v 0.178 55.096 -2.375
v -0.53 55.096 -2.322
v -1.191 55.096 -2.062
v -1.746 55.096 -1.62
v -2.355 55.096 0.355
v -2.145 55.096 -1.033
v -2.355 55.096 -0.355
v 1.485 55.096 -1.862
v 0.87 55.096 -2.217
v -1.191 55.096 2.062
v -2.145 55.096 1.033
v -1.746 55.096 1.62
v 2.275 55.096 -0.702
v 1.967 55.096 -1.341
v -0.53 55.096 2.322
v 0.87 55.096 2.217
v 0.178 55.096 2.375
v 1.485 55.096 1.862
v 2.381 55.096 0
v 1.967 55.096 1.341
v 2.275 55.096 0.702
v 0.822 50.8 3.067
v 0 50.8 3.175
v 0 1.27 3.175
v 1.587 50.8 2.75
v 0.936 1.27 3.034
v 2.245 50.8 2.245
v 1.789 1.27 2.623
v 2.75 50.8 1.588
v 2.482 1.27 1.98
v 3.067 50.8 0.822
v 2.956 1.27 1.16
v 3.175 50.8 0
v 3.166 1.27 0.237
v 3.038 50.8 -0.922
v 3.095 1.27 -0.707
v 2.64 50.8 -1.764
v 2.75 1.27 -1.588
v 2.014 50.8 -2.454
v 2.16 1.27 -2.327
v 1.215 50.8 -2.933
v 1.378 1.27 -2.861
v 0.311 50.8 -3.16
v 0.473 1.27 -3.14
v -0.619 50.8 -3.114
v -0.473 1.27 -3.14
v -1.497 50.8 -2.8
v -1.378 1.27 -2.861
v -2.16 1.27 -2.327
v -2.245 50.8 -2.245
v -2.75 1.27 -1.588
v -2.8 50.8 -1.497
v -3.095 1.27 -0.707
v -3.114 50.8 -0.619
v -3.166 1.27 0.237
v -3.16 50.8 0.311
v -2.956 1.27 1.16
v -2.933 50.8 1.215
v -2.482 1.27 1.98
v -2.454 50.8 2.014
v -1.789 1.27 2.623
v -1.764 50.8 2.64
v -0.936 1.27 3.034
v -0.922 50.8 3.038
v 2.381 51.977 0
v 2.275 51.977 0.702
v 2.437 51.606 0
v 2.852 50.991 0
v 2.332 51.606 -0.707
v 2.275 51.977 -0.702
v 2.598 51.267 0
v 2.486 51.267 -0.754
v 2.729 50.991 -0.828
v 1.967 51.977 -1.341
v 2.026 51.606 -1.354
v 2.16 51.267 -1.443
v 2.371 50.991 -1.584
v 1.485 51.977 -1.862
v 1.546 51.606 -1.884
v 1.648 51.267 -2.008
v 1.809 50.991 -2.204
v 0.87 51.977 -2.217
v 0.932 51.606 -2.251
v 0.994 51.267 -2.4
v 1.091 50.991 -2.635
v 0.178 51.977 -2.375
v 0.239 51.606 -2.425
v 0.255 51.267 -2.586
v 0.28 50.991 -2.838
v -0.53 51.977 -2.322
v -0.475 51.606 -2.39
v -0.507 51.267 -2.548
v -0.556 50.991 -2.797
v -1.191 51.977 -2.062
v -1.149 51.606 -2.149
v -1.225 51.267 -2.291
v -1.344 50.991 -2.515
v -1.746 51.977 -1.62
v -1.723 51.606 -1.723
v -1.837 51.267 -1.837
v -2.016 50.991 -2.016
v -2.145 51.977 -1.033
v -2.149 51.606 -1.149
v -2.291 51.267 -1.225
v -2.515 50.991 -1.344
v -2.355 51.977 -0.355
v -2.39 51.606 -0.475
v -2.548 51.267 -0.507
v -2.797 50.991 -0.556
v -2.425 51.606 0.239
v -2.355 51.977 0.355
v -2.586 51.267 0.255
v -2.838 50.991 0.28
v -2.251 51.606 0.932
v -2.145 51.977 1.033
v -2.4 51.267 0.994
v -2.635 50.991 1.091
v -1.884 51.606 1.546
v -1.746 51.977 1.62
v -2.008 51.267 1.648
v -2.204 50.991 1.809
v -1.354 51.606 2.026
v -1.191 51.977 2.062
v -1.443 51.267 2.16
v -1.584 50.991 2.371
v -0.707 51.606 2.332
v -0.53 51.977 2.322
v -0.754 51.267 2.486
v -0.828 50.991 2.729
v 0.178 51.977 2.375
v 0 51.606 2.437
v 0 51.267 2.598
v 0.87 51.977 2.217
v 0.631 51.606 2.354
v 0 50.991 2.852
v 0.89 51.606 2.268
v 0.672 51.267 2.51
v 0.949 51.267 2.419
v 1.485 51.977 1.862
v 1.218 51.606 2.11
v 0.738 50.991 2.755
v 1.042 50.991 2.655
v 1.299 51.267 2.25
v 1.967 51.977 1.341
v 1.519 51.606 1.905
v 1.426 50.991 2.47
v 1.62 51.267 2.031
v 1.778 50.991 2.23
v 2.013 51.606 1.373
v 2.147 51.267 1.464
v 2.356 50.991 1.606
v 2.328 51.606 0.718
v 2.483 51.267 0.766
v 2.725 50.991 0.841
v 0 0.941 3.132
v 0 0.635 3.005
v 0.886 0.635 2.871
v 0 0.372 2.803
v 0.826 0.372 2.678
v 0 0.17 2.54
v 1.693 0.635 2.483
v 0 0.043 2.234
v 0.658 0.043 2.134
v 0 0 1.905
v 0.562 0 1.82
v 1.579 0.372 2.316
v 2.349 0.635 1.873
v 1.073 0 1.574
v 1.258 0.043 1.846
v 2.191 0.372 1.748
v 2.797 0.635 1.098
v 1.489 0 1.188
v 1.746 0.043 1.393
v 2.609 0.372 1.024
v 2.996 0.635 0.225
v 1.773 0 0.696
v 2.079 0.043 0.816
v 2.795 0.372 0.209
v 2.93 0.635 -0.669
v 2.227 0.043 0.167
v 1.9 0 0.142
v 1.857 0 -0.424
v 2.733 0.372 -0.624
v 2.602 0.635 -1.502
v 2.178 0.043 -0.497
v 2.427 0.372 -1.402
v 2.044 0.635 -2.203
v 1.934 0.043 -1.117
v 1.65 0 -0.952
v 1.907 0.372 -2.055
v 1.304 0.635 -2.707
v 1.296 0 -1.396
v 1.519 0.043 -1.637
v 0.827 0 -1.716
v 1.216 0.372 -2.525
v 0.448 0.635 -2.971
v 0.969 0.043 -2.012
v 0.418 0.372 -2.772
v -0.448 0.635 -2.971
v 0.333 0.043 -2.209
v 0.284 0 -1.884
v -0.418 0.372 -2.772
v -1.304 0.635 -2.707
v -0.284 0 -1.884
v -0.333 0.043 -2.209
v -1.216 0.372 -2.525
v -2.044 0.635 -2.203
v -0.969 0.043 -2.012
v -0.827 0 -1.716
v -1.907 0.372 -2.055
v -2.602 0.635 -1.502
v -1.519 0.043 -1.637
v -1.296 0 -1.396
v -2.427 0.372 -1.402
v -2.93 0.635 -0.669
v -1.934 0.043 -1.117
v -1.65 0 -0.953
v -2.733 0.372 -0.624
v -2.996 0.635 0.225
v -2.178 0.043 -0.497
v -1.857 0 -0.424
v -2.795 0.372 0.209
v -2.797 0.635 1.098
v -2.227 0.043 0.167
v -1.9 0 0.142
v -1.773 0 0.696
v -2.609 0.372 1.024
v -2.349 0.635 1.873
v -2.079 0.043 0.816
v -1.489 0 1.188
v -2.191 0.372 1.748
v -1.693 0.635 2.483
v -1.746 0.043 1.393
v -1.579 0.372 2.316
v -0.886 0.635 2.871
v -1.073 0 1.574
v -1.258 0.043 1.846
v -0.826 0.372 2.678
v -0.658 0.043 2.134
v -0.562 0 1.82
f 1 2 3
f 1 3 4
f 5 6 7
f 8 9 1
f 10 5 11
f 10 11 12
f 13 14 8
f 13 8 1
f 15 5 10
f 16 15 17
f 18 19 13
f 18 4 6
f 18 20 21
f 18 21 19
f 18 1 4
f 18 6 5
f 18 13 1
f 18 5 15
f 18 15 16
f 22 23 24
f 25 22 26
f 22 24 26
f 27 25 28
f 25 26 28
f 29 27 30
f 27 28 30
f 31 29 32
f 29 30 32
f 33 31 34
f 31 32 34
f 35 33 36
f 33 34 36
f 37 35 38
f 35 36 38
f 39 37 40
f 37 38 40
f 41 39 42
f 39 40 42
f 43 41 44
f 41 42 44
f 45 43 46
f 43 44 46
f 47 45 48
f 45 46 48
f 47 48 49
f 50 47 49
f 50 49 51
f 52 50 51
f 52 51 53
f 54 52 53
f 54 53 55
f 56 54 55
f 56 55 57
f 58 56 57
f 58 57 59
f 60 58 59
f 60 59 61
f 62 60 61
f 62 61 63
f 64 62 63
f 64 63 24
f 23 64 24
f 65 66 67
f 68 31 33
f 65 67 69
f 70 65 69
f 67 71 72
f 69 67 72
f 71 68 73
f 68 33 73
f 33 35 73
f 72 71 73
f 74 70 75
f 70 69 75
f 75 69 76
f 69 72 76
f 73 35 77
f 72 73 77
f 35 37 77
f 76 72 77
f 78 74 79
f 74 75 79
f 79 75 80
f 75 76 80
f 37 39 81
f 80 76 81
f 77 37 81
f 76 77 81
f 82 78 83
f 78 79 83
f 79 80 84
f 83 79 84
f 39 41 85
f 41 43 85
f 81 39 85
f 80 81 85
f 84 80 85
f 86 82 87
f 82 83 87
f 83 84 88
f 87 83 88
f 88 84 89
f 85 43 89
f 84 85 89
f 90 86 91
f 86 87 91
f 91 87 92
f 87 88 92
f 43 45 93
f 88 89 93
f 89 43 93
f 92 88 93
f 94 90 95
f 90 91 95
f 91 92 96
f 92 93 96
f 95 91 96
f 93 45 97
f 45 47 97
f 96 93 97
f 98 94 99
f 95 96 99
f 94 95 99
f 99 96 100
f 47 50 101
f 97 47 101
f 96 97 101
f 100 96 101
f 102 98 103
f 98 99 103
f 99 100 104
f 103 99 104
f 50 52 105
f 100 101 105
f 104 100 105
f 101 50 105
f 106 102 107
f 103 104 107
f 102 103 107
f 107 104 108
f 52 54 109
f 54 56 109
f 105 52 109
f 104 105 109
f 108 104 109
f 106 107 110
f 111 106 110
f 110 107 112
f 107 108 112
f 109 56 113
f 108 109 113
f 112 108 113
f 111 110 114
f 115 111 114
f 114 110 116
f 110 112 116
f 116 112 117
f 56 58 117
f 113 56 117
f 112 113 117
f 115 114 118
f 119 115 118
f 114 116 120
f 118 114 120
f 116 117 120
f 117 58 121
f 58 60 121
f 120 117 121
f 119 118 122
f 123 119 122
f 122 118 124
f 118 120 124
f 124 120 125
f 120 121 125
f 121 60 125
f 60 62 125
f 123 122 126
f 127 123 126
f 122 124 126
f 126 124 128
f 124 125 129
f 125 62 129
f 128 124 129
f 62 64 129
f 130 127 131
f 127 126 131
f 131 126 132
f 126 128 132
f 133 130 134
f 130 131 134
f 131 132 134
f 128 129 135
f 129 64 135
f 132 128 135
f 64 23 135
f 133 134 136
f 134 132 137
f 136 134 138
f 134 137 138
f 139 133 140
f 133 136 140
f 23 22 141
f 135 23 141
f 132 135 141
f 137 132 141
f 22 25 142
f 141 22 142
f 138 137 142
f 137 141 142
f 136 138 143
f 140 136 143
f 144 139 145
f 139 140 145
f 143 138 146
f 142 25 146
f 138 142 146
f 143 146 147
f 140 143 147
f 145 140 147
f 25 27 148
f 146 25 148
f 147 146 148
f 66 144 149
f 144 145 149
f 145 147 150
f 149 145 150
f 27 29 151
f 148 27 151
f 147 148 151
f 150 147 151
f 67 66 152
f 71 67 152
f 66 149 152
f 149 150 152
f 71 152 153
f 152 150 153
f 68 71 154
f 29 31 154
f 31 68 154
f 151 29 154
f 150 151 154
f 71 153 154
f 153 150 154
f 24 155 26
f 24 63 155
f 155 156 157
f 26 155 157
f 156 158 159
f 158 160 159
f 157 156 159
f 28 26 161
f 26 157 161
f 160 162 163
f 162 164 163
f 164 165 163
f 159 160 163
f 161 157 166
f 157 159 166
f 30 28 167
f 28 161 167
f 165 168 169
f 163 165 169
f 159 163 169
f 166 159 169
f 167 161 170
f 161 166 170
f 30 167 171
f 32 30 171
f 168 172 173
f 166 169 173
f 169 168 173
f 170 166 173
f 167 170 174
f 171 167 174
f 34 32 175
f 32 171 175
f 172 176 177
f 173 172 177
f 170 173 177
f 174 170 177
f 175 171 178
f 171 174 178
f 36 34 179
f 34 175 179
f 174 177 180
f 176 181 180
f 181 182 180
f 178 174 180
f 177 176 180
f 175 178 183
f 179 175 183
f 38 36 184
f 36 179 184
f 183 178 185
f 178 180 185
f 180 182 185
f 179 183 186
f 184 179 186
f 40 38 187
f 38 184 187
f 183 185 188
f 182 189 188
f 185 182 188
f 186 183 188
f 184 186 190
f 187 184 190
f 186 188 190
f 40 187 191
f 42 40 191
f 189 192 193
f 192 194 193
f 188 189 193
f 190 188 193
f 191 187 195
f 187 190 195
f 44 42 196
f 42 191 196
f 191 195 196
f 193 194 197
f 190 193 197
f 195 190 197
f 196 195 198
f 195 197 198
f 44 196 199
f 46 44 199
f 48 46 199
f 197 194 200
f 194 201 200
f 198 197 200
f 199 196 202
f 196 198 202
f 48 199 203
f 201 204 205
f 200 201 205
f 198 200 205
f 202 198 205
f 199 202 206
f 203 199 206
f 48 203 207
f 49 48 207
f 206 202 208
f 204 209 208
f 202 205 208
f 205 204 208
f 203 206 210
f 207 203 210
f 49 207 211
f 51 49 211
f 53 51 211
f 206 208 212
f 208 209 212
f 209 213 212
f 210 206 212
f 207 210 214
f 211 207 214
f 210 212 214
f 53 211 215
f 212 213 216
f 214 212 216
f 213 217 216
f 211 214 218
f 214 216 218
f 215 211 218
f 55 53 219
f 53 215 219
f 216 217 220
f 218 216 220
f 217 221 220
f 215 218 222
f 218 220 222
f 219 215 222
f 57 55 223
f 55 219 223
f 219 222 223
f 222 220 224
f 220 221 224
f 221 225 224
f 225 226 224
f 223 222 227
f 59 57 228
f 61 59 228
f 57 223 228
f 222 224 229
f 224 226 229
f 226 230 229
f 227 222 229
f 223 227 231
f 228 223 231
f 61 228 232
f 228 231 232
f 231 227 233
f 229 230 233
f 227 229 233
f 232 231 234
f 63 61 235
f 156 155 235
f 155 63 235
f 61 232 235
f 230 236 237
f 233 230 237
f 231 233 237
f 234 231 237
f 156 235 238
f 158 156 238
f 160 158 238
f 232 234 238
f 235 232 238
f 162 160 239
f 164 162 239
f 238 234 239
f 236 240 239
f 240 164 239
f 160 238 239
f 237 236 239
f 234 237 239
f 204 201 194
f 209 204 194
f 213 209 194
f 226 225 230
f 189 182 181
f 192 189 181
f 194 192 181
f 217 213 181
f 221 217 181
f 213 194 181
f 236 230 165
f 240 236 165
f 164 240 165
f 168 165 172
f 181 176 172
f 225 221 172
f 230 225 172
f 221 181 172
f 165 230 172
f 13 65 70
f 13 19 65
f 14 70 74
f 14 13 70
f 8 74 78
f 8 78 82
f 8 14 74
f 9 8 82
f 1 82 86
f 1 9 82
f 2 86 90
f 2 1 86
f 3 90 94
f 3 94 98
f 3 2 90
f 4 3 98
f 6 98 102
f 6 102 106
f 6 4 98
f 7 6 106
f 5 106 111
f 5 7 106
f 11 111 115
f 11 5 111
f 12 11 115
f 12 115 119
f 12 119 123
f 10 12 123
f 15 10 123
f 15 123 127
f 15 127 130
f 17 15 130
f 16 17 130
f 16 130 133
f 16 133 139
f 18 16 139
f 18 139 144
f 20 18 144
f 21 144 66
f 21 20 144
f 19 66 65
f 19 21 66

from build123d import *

# Parameters (mm, degrees)
SKETCH1_R           = 3.175
BOSS_EXTRUDE1_DEPTH = 50.8
FILLET1_R           = 1.27
SKETCH4_R           = 2.38125
FILLET2_R           = 1.27


with BuildPart() as part:
    # Sketch1 → Boss-Extrude1 (new body)
    with BuildSketch(Plane(origin=(0, 0, 0), x_dir=(1, 0, 0), z_dir=(0, 1, 0))):
        with Locations(Location((0, 0, 0), (0, 0, 270))):
            Circle(SKETCH1_R)
    extrude(amount=BOSS_EXTRUDE1_DEPTH)

    # Fillet1
    fillet1_edges = [part.edges().sort_by_distance(p)[0] for p in [
        (0, 0, -3.175),
    ]]
    fillet(fillet1_edges, radius=FILLET1_R)

    # Sweep1: sweep along a path in Sketch2
    with BuildLine(Plane.XY) as sweep1_path:
        Line((0, 50.8), (0, 55.095962307))
    # Sketch4 → Sweep1 (sweep)
    with BuildSketch(Plane(origin=(0, 50.8, 0), x_dir=(1, 0, 0), z_dir=(0, 1, 0))):
        Circle(SKETCH4_R)
    sweep(path=sweep1_path.line)

    # Fillet2
    # the kernel refuses this fillet: 1.27 mm, written as the material it adds along each edge
    with BuildSketch(Plane(origin=(0, 50.8, 0), x_dir=(1, 0, 0), z_dir=(0, 0, 1))) as fillet2_piece_1:
        with BuildLine():
            CenterArc((3.65125, 1.17732151), FILLET2_R, 180, 67.975687163)
            Line((2.38125, 1.17732151), (2.35585, 1.17732151))
            Line((2.35585, 1.17732151), (2.35585, 0))
            Line((2.35585, 0), (2.38125, -0.0254))
            ThreePointArc((2.38125, -0.0254), (2.778125, -0.0254), (3.165475, -0.02354643))
            Line((3.165475, -0.02354643), (3.175, 0))
        make_face()
    revolve(axis=Axis((0, 50.8, 0), (0, 1, 0)))


solid = part.part
